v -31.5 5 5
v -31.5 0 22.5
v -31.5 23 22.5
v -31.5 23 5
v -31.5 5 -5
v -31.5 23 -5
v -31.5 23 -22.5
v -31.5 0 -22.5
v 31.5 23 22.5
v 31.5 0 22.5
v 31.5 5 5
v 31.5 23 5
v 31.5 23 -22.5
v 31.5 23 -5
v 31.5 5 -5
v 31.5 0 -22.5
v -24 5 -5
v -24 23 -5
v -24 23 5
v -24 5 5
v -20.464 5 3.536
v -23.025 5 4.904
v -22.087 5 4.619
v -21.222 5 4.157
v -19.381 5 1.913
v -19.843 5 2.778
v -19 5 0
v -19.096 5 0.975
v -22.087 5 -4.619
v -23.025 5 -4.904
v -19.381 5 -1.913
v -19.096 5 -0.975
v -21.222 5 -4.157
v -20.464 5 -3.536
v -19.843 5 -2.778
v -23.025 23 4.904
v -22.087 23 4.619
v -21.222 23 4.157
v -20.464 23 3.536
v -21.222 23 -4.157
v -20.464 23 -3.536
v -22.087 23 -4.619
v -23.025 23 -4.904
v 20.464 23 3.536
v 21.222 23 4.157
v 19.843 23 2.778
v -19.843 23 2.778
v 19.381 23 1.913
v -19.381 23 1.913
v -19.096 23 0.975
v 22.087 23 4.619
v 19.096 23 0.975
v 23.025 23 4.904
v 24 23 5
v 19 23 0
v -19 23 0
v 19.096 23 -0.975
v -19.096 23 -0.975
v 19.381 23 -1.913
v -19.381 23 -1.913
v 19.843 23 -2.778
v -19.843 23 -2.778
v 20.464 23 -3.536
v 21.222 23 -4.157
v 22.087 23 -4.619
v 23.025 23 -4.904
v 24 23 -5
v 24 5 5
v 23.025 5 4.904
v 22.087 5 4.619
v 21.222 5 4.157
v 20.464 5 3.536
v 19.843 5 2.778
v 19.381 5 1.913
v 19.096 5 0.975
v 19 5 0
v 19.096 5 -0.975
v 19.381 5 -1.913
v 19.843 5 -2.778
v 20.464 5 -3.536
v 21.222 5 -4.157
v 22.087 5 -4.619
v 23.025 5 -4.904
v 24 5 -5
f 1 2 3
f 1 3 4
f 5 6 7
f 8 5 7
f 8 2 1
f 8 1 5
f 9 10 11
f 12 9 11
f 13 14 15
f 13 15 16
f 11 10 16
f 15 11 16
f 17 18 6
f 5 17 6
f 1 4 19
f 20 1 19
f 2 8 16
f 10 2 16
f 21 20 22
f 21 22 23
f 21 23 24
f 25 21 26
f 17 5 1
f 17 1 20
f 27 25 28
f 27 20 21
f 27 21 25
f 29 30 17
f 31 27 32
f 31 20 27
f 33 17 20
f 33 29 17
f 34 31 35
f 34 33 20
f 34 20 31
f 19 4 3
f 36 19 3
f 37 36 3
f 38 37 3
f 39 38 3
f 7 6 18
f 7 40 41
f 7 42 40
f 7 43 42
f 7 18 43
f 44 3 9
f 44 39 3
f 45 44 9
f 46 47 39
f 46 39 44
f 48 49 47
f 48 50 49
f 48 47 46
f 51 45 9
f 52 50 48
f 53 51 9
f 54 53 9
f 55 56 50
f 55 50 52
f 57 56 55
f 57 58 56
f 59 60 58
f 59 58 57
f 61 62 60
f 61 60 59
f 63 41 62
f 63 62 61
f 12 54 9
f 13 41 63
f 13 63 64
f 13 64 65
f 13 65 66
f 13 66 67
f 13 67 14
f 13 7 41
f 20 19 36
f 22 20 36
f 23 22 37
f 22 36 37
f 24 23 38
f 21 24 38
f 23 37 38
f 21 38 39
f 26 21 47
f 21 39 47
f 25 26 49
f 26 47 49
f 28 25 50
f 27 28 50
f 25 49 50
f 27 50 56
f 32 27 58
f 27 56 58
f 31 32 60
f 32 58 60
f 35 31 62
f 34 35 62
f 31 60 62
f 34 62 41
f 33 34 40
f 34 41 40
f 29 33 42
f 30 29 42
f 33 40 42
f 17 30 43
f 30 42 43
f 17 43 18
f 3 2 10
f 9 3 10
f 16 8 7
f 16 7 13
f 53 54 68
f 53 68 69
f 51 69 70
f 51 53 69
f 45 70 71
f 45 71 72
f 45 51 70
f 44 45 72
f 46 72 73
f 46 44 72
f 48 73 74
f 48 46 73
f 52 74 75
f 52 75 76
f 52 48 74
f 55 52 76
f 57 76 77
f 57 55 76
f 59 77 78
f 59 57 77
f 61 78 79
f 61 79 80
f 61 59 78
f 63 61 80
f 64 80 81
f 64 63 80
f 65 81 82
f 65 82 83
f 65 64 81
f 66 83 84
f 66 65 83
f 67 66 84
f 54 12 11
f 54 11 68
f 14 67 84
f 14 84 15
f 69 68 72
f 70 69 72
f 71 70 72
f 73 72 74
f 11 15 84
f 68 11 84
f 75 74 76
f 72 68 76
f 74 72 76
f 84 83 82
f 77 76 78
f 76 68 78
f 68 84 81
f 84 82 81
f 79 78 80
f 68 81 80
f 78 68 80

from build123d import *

# Parameters (mm, degrees)
SKETCH1_W           = 63
SKETCH1_H           = 45
BOSS_EXTRUDE1_DEPTH = 23
CUT_EXTRUDE1_DEPTH  = 18


with BuildPart() as part:
    # Sketch1 → Boss-Extrude1 (new body)
    with BuildSketch(Plane(origin=(0, 0, 0), x_dir=(1, 0, 0), z_dir=(0, 1, 0))):
        Rectangle(SKETCH1_W, SKETCH1_H)
    extrude(amount=BOSS_EXTRUDE1_DEPTH)

    # Sketch2 → Cut-Extrude1 (cut)
    with BuildSketch(Plane(origin=(0, 23, 0), x_dir=(1, 0, 0), z_dir=(0, 1, 0))):
        with BuildLine():
            Line((24, 5), (38.956997059, 5))
            ThreePointArc((38.956997059, 5), (43.956997059, 0), (38.956997059, -5))
            Line((38.956997059, -5), (24, -5))
            ThreePointArc((24, -5), (19, 0), (24, 5))
        make_face()
        with BuildLine():
            Line((-24, 5), (-38.956997059, 5))
            ThreePointArc((-38.956997059, 5), (-43.956997059, 0), (-38.956997059, -5))
            Line((-38.956997059, -5), (-24, -5))
            ThreePointArc((-24, -5), (-19, 0), (-24, 5))
        make_face()
    extrude(amount=-CUT_EXTRUDE1_DEPTH, mode=Mode.SUBTRACT)


solid = part.part
